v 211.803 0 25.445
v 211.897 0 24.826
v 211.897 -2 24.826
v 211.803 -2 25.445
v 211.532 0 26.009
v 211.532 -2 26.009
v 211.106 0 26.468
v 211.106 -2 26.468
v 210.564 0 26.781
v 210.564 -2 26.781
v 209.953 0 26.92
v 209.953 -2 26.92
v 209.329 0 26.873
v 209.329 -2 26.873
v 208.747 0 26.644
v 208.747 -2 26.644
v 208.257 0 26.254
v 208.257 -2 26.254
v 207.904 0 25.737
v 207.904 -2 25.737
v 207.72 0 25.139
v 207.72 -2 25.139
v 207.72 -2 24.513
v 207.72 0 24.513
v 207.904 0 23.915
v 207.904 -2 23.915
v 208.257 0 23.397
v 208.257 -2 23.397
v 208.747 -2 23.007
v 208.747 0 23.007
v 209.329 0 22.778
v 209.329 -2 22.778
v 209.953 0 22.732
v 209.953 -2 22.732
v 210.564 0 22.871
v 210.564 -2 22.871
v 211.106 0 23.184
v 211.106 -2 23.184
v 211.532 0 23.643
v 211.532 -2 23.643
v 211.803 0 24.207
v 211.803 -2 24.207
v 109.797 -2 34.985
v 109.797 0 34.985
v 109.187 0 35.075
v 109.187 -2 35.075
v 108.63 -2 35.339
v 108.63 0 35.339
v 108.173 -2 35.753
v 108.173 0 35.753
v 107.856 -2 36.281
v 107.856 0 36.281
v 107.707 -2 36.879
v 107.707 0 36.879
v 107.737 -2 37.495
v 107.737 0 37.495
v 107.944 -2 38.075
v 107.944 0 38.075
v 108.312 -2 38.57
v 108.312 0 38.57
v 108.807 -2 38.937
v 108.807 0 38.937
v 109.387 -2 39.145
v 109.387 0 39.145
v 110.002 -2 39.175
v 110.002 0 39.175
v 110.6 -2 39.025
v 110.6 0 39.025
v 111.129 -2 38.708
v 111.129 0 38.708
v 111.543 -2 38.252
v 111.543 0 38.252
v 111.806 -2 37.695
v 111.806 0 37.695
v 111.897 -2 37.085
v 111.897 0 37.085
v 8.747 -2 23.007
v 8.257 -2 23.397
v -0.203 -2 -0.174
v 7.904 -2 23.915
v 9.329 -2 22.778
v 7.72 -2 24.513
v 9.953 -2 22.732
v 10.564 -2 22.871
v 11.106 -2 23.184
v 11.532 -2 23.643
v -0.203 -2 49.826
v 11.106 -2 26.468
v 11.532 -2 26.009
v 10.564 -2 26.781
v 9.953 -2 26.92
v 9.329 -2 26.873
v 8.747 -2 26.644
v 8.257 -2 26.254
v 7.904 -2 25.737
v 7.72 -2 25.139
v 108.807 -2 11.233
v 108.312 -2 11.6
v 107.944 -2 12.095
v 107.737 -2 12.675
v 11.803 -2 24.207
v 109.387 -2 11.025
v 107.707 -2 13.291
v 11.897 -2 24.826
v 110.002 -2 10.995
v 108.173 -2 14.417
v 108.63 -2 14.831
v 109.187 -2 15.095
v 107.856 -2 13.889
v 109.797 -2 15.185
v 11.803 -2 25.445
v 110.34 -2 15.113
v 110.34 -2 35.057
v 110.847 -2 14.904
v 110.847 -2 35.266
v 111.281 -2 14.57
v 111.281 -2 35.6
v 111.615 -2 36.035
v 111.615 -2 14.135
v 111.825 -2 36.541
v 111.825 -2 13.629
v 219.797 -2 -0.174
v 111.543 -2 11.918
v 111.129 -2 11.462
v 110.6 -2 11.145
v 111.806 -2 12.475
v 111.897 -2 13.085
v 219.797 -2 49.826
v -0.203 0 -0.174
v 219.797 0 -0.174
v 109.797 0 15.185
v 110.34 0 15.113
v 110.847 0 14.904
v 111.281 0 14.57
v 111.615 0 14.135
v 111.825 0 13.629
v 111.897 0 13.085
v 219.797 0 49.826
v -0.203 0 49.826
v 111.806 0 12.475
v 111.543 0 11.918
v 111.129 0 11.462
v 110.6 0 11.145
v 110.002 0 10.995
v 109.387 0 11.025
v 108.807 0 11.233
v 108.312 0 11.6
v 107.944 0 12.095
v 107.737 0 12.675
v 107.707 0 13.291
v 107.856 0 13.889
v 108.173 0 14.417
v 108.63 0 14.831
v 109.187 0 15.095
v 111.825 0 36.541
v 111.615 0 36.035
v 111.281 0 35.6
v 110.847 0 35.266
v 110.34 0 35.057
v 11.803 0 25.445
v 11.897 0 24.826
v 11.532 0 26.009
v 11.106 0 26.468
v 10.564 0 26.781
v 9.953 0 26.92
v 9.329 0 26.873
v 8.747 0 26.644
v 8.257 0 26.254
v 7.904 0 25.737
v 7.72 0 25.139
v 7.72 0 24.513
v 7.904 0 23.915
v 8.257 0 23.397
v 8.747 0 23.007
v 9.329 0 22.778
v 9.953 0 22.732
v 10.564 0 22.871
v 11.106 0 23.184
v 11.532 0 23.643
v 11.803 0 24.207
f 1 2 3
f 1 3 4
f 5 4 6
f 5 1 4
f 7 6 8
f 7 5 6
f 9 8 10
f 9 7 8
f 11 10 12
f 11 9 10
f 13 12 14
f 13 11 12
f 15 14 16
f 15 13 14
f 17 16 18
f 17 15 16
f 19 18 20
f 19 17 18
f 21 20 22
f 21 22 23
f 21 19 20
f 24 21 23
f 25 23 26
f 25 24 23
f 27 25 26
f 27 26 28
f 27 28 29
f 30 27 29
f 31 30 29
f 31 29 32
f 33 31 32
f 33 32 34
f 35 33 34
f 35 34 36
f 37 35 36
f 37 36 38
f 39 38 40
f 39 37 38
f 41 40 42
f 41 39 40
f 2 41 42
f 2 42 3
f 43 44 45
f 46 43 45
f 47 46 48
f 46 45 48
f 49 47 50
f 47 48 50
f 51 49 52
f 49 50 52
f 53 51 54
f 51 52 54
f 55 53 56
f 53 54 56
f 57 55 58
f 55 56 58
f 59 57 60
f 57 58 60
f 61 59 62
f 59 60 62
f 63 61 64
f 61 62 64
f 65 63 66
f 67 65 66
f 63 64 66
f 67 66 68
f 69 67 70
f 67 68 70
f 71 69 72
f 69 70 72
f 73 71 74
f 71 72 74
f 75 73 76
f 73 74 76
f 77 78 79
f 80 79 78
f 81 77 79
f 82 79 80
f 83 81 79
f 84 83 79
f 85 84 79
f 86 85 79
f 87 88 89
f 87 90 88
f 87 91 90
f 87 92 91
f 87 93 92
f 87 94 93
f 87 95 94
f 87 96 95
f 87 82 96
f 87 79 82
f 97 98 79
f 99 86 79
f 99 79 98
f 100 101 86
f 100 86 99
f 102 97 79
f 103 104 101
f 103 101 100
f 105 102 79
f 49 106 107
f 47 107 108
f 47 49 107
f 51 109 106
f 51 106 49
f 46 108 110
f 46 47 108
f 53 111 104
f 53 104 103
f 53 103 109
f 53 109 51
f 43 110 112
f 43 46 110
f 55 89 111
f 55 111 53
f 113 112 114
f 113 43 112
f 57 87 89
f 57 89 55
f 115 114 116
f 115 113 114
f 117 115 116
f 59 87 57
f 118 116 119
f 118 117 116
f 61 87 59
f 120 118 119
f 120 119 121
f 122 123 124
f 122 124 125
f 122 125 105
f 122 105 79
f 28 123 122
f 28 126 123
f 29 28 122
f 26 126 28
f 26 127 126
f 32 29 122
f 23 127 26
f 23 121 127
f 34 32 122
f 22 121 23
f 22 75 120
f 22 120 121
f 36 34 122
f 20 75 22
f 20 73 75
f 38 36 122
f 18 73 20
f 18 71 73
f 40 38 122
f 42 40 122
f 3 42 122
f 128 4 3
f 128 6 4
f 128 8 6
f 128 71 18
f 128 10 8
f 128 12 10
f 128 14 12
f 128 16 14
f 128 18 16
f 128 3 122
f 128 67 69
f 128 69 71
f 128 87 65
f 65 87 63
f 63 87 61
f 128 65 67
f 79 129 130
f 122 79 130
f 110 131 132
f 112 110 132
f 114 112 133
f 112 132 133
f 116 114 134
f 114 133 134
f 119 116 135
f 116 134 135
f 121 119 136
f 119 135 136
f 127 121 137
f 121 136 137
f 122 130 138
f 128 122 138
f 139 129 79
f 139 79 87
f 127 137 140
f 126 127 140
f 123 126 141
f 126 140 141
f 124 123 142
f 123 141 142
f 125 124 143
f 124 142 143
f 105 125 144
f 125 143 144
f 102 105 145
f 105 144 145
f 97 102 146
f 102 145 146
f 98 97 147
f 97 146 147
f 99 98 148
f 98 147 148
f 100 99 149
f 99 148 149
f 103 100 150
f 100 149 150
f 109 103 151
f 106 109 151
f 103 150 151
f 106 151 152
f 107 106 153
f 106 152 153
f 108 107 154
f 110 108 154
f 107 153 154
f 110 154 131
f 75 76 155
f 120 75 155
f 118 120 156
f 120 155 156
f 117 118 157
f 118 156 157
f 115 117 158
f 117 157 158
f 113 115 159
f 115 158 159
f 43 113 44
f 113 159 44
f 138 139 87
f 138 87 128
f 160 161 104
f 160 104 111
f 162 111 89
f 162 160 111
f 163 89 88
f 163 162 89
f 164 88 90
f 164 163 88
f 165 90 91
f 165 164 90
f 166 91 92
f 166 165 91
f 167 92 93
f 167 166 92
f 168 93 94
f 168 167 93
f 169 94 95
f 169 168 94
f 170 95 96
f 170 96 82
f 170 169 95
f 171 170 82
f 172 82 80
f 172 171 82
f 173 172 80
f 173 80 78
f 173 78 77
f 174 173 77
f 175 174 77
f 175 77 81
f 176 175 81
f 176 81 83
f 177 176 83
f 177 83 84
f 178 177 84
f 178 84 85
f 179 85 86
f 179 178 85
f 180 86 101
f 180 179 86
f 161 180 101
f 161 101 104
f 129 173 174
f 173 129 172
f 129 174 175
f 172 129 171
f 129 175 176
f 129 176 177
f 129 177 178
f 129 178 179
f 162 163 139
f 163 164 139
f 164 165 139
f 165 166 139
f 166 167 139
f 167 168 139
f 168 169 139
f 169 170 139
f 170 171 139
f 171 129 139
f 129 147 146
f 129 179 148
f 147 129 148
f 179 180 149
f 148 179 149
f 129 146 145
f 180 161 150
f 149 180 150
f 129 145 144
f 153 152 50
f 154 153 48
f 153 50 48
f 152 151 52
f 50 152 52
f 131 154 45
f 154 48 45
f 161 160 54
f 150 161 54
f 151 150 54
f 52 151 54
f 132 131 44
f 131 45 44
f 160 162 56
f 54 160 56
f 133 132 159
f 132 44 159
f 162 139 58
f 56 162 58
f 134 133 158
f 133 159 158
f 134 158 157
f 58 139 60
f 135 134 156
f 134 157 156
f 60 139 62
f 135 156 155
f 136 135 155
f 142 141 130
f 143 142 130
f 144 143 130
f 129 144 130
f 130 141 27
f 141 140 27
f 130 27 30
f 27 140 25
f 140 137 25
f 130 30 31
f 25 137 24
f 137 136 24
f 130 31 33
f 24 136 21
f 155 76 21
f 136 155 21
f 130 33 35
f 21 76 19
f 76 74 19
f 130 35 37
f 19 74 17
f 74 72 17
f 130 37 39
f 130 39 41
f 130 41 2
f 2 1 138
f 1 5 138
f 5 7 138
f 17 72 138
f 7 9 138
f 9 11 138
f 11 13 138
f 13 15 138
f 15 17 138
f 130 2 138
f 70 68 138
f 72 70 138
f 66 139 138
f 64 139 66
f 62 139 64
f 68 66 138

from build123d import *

# Parameters (mm, degrees)
F0_W     = 220
F0_H     = 50
F0_R     = 2.1
F1_DEPTH = 2


with BuildPart() as f1:
    # F0 (on Front) → F1 (new body)
    with BuildSketch(Plane.XZ):
        with Locations((109.796509, 24.825824)):
            Rectangle(F0_W, F0_H)
        with BuildLine():
            ThreePointArc((111.896509, 13.085015), (108.311585, 11.600091), (109.796509, 15.185015))
            ThreePointArc((109.796509, 15.185015), (111.281433, 14.56994), (111.896509, 13.085015))
        make_face(mode=Mode.SUBTRACT)
        with Locations((9.796509, 24.825824)):
            Circle(F0_R, mode=Mode.SUBTRACT)
        with BuildLine():
            ThreePointArc((109.796509, 34.985015), (108.311585, 38.56994), (111.896509, 37.085015))
            ThreePointArc((111.896509, 37.085015), (111.281433, 35.600091), (109.796509, 34.985015))
        make_face(mode=Mode.SUBTRACT)
        with Locations((209.796509, 24.825824)):
            Circle(F0_R, mode=Mode.SUBTRACT)
    extrude(amount=F1_DEPTH)


solid = f1.part
